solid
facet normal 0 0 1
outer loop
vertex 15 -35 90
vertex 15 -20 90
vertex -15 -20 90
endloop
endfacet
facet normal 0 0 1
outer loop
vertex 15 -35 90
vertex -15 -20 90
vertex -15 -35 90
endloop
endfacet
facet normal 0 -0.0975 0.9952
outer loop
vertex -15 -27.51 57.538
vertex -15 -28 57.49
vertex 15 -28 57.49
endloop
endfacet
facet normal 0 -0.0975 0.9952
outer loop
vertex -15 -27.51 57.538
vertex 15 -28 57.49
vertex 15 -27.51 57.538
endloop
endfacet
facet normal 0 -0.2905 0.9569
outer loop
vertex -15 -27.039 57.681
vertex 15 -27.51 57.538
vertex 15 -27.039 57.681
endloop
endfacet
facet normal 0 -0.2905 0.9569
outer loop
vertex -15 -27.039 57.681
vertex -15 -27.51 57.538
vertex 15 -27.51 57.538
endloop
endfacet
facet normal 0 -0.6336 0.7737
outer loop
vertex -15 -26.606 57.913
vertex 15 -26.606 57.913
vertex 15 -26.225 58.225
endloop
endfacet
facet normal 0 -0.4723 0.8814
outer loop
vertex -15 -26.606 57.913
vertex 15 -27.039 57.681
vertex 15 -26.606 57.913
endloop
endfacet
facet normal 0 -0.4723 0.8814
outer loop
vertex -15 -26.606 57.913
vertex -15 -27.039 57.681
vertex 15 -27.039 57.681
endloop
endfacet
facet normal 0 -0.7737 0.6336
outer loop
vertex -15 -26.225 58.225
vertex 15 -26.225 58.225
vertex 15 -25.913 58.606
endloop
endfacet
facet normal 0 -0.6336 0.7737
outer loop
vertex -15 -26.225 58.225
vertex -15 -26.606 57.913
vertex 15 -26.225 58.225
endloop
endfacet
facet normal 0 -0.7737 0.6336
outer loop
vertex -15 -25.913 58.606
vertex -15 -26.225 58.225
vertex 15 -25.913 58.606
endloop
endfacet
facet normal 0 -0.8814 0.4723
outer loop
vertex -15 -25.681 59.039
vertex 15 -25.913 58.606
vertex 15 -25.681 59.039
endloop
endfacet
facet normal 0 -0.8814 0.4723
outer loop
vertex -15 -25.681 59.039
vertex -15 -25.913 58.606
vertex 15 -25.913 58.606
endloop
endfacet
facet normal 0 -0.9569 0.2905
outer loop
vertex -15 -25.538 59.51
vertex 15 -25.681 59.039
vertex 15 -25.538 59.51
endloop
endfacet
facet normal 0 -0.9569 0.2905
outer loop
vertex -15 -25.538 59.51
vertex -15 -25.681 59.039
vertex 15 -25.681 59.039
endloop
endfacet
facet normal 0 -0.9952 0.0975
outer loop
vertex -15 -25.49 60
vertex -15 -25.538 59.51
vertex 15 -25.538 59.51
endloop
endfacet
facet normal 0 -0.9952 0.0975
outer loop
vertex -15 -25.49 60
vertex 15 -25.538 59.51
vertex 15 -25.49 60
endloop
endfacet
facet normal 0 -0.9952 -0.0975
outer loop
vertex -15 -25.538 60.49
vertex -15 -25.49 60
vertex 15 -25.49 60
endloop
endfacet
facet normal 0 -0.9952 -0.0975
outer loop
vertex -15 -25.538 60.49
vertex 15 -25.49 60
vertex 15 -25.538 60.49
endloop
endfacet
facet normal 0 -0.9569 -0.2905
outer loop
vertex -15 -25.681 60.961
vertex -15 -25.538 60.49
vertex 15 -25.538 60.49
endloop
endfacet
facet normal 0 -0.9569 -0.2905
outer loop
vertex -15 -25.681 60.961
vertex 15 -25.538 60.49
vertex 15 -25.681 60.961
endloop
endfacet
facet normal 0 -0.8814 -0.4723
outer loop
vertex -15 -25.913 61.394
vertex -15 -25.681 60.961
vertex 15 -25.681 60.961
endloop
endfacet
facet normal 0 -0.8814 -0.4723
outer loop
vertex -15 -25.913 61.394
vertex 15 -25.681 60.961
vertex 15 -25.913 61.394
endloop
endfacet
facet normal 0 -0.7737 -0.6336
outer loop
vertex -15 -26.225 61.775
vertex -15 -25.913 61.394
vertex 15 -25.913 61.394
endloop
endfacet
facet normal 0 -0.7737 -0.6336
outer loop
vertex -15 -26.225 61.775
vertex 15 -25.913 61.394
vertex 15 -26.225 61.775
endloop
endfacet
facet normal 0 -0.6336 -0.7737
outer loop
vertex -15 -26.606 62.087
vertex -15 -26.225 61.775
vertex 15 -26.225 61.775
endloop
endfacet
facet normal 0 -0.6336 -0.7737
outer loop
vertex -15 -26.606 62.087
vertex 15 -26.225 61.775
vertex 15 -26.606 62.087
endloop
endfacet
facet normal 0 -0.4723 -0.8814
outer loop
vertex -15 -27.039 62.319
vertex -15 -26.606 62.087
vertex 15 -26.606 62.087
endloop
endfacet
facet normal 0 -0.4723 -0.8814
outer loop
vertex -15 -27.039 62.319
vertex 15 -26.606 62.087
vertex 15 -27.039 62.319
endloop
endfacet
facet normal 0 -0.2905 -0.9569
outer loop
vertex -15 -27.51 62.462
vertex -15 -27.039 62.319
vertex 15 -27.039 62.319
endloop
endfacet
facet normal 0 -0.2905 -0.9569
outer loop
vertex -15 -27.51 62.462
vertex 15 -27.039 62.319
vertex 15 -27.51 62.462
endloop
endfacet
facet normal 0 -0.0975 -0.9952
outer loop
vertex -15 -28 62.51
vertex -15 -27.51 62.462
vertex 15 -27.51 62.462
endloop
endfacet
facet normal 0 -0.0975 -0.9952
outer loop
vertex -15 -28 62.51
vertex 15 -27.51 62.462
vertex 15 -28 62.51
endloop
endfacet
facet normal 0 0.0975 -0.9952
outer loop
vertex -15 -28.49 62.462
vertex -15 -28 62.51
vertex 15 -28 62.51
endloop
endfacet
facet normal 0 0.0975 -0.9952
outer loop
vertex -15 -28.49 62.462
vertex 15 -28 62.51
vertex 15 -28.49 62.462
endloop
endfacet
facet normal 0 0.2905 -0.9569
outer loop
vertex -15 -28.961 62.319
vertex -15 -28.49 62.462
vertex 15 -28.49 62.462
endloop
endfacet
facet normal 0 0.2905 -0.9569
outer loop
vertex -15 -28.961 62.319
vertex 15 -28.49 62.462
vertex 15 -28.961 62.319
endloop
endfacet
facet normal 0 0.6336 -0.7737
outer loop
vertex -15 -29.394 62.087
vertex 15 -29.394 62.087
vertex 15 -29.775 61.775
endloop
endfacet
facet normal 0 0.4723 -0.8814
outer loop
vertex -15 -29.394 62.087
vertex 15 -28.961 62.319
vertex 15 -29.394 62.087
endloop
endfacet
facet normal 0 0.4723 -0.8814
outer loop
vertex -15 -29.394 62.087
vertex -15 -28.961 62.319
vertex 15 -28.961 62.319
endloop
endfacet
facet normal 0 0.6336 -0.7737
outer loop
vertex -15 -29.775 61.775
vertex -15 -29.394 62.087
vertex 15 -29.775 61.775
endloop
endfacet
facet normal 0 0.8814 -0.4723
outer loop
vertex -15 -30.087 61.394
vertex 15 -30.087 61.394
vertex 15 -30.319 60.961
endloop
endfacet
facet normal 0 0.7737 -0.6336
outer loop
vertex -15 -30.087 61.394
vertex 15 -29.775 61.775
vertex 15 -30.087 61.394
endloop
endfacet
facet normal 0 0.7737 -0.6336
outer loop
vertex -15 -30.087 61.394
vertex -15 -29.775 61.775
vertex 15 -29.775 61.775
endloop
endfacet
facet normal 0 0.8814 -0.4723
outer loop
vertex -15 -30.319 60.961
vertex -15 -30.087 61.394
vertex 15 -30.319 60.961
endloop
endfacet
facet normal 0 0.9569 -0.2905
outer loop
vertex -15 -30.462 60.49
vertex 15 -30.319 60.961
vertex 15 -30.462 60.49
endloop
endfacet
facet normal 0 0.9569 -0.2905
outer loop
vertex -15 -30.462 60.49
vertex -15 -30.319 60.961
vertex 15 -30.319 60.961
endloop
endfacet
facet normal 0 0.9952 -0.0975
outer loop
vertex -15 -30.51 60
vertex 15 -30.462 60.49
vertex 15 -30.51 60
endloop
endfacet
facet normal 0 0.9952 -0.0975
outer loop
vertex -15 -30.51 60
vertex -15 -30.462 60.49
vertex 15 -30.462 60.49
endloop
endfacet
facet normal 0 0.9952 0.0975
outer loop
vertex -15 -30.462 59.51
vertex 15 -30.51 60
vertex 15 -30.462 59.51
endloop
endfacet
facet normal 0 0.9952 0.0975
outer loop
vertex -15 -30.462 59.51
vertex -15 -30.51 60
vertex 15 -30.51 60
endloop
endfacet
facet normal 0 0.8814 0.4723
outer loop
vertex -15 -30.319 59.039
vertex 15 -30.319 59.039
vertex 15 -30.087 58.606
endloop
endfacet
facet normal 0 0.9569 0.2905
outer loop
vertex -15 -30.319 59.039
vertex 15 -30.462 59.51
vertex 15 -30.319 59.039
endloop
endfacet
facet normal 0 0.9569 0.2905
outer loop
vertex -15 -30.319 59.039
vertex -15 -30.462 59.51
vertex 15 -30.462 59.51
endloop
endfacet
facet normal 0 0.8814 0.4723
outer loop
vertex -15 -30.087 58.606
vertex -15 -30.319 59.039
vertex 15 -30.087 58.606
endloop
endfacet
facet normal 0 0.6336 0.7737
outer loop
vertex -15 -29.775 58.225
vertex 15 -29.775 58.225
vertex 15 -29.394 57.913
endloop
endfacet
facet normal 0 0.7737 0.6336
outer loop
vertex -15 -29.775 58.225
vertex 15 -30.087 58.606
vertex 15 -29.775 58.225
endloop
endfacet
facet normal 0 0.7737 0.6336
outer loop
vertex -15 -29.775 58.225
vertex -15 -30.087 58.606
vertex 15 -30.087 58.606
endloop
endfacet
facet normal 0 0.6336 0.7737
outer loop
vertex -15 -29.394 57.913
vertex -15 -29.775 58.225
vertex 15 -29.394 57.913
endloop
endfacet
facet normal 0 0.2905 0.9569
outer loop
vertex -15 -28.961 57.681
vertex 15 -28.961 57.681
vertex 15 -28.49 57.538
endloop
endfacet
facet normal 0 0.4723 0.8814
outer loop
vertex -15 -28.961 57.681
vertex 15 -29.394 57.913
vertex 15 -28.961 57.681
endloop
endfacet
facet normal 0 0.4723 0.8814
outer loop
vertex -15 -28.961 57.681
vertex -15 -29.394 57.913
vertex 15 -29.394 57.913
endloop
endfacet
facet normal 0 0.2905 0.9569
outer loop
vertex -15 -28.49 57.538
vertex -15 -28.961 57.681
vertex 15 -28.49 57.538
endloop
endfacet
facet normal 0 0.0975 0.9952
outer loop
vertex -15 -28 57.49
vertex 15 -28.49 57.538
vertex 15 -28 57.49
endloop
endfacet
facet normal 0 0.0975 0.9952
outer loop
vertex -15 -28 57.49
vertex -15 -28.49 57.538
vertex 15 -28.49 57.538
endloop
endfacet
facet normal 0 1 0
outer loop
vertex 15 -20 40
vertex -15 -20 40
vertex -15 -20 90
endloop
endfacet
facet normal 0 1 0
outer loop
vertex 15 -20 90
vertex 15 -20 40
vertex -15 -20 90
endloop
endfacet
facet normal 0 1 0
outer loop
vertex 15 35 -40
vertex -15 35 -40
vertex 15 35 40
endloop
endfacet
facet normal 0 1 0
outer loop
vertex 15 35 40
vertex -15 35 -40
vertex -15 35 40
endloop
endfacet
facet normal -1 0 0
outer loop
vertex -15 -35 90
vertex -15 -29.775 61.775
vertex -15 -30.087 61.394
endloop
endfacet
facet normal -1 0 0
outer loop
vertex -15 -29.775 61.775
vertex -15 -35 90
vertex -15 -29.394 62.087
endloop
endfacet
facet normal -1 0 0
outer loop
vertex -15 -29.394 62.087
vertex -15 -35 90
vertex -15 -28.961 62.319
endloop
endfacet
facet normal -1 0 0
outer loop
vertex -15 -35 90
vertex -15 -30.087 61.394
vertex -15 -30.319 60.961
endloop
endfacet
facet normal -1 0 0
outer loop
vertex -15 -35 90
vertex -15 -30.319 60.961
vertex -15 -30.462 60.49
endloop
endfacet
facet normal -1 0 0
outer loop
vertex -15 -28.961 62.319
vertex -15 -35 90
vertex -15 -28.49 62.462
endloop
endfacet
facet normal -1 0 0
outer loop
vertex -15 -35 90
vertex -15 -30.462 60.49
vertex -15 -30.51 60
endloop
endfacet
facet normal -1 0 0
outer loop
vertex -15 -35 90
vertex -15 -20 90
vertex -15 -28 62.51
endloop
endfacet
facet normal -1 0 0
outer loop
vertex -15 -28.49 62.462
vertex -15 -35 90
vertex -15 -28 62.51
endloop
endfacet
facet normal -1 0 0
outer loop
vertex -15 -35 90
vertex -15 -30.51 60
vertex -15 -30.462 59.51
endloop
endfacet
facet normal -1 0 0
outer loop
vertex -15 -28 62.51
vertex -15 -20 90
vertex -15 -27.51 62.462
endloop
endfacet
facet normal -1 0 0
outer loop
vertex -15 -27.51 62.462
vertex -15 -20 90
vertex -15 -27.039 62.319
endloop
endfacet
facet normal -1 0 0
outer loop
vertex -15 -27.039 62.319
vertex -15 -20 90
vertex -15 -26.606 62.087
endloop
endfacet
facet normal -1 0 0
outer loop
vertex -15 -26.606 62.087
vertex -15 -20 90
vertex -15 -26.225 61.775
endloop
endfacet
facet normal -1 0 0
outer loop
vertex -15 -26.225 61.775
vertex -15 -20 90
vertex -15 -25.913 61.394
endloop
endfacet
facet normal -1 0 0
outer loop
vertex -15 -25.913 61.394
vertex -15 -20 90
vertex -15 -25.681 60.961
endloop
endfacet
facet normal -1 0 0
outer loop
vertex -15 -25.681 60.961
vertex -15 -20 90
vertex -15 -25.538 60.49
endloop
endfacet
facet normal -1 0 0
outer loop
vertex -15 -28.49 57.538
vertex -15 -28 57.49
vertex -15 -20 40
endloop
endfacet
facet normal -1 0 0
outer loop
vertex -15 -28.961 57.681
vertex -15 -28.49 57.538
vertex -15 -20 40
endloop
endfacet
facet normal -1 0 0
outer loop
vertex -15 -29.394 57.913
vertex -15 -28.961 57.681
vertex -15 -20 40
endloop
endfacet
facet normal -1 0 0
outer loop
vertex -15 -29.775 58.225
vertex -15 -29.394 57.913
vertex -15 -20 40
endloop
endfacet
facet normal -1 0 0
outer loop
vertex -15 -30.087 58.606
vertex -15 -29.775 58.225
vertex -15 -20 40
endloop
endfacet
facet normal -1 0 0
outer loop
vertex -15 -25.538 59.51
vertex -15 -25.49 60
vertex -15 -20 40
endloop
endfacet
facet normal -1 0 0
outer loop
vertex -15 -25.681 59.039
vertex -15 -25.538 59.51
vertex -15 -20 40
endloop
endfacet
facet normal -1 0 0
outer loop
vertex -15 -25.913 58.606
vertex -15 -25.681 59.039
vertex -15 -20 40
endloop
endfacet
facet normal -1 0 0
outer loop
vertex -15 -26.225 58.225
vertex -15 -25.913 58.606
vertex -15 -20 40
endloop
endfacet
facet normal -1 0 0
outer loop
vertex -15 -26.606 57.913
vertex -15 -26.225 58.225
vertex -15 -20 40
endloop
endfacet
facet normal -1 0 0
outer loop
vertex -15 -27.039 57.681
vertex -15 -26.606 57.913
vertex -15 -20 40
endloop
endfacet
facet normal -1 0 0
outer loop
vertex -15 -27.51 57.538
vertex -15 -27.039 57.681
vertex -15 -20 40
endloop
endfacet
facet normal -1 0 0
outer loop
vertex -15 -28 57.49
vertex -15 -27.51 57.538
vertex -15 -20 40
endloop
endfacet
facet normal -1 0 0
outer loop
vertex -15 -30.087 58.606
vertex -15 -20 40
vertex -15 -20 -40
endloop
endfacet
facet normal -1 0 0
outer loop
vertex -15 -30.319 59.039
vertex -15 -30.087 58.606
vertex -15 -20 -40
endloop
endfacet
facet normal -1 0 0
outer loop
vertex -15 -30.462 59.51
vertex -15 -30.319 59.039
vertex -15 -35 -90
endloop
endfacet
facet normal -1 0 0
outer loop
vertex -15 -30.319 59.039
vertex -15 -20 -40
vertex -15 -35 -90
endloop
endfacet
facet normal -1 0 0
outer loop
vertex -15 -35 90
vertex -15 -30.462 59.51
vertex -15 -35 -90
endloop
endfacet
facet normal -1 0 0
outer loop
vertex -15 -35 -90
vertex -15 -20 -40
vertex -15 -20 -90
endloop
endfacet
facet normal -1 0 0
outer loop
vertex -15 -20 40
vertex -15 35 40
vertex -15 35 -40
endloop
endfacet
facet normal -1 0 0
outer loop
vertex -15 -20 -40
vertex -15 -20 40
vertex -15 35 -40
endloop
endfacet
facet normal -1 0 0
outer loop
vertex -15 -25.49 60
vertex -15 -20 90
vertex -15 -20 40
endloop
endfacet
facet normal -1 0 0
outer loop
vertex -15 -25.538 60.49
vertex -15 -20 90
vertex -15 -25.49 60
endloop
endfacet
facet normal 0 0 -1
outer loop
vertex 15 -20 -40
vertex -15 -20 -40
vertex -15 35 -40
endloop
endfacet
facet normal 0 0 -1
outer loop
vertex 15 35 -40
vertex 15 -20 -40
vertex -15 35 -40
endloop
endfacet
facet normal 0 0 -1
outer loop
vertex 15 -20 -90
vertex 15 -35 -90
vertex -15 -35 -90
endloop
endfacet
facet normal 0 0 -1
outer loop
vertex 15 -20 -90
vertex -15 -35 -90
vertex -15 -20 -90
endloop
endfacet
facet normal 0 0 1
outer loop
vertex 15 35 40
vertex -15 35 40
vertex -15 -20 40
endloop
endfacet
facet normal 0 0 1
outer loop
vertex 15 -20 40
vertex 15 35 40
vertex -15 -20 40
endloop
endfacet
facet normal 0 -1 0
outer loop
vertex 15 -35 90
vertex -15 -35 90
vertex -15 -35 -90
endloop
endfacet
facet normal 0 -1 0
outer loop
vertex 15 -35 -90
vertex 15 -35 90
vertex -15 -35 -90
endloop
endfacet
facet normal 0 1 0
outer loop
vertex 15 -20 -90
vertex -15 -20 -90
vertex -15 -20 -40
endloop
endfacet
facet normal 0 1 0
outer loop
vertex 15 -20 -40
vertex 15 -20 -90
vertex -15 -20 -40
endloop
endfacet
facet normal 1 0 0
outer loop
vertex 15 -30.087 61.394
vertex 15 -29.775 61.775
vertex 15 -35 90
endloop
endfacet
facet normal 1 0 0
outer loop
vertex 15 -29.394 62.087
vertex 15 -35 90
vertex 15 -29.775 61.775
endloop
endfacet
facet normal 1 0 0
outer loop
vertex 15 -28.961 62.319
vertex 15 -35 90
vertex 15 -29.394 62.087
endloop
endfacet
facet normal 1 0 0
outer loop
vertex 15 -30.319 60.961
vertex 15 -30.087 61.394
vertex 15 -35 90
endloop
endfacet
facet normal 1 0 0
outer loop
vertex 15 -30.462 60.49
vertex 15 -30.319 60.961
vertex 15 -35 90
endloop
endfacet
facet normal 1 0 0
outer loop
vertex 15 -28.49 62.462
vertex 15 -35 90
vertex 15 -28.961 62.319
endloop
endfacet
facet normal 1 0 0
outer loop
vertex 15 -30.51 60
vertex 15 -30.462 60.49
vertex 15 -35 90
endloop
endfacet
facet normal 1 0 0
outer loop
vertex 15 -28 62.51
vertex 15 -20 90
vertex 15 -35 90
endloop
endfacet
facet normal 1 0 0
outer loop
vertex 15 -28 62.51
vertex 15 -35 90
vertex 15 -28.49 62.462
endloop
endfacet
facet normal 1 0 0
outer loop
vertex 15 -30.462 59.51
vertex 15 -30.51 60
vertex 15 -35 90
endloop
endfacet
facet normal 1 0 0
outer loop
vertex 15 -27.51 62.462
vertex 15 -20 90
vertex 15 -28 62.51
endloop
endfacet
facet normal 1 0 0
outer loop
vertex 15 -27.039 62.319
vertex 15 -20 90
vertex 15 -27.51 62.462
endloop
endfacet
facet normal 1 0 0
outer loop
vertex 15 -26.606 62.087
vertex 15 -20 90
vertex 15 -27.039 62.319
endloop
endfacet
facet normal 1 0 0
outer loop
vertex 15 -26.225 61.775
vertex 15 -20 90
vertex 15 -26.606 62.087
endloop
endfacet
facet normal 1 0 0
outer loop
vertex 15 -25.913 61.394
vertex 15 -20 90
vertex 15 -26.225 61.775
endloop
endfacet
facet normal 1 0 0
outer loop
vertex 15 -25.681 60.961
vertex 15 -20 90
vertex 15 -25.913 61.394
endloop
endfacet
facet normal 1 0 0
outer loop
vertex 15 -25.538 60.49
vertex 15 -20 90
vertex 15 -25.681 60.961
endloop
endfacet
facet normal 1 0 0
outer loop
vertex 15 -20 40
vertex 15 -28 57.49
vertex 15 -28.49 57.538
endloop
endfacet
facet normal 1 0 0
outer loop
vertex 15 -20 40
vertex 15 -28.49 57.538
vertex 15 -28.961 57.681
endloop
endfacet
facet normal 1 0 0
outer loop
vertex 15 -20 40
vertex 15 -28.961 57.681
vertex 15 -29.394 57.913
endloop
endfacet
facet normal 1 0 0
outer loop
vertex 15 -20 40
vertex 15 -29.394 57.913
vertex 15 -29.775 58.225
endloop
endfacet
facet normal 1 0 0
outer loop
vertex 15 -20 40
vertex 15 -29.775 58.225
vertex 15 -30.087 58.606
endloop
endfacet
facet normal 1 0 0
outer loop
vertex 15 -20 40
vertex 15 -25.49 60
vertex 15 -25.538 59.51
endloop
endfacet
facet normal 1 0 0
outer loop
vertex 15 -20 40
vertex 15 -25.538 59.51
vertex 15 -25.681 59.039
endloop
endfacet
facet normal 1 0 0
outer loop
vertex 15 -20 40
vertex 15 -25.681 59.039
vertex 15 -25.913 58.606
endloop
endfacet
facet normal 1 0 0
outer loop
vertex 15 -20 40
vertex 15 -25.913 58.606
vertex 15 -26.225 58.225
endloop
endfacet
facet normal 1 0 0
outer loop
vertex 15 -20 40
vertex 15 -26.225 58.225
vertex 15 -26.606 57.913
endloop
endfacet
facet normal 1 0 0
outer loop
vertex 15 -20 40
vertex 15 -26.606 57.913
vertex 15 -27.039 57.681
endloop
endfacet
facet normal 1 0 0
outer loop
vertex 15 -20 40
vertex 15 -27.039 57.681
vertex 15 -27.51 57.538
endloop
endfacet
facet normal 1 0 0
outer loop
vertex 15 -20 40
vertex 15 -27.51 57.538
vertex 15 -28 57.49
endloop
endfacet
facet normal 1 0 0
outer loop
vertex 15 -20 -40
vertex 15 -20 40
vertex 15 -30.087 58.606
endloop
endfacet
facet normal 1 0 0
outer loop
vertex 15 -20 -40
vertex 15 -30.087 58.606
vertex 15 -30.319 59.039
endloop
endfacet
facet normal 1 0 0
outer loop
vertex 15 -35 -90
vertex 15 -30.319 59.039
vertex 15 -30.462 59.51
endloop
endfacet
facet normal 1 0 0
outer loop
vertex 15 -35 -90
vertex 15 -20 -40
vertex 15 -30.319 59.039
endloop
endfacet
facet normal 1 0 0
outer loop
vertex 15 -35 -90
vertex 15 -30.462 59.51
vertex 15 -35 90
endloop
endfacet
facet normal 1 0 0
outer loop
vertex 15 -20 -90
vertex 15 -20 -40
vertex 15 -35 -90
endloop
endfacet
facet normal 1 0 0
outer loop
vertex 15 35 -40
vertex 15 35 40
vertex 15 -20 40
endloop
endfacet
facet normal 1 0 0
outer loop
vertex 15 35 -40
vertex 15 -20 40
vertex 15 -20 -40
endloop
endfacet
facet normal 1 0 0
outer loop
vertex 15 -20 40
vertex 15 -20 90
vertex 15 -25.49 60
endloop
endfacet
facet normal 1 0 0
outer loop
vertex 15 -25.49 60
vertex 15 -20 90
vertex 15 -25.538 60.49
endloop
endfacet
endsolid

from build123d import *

# Parameters (mm, degrees)
MAINBODY_EXTRUDE_START        = -15
MAINBODY_EXTRUDE_DEPTH        = 30
PIVOTSHAFTHOLE_CUT_DEPTH      = 98.724101428
PIVOTSHAFTHOLE_CUT_DEPTH_BACK = 98.724101428
PIVOTSHAFTHOLE_SKETCH_R       = 2.51


with BuildPart() as part:
    # projectionYz_sketch → mainBody_extrude (new body)
    with BuildSketch(Plane(origin=(0, 0, 0), x_dir=(0, 0, -1), z_dir=(1, 0, 0)).offset(MAINBODY_EXTRUDE_START)):
        Polygon((90, -35), (90, -20), (40, -20), (40, 35), (-40, 35), (-40, -20), (-90, -20), (-90, -35), align=None)
    extrude(amount=MAINBODY_EXTRUDE_DEPTH)

    # pivotShaftHole_sketch → pivotShaftHole_cut (cut, two sides: drawn at the far end of the back side and taken through both)
    with BuildSketch(Plane(origin=(0, 0, 0), x_dir=(0, 0, -1), z_dir=(1, 0, 0)).offset(-PIVOTSHAFTHOLE_CUT_DEPTH_BACK)):
        with Locations((-60, -28)):
            Circle(PIVOTSHAFTHOLE_SKETCH_R)
    extrude(amount=PIVOTSHAFTHOLE_CUT_DEPTH + PIVOTSHAFTHOLE_CUT_DEPTH_BACK, mode=Mode.SUBTRACT)


solid = part.part
